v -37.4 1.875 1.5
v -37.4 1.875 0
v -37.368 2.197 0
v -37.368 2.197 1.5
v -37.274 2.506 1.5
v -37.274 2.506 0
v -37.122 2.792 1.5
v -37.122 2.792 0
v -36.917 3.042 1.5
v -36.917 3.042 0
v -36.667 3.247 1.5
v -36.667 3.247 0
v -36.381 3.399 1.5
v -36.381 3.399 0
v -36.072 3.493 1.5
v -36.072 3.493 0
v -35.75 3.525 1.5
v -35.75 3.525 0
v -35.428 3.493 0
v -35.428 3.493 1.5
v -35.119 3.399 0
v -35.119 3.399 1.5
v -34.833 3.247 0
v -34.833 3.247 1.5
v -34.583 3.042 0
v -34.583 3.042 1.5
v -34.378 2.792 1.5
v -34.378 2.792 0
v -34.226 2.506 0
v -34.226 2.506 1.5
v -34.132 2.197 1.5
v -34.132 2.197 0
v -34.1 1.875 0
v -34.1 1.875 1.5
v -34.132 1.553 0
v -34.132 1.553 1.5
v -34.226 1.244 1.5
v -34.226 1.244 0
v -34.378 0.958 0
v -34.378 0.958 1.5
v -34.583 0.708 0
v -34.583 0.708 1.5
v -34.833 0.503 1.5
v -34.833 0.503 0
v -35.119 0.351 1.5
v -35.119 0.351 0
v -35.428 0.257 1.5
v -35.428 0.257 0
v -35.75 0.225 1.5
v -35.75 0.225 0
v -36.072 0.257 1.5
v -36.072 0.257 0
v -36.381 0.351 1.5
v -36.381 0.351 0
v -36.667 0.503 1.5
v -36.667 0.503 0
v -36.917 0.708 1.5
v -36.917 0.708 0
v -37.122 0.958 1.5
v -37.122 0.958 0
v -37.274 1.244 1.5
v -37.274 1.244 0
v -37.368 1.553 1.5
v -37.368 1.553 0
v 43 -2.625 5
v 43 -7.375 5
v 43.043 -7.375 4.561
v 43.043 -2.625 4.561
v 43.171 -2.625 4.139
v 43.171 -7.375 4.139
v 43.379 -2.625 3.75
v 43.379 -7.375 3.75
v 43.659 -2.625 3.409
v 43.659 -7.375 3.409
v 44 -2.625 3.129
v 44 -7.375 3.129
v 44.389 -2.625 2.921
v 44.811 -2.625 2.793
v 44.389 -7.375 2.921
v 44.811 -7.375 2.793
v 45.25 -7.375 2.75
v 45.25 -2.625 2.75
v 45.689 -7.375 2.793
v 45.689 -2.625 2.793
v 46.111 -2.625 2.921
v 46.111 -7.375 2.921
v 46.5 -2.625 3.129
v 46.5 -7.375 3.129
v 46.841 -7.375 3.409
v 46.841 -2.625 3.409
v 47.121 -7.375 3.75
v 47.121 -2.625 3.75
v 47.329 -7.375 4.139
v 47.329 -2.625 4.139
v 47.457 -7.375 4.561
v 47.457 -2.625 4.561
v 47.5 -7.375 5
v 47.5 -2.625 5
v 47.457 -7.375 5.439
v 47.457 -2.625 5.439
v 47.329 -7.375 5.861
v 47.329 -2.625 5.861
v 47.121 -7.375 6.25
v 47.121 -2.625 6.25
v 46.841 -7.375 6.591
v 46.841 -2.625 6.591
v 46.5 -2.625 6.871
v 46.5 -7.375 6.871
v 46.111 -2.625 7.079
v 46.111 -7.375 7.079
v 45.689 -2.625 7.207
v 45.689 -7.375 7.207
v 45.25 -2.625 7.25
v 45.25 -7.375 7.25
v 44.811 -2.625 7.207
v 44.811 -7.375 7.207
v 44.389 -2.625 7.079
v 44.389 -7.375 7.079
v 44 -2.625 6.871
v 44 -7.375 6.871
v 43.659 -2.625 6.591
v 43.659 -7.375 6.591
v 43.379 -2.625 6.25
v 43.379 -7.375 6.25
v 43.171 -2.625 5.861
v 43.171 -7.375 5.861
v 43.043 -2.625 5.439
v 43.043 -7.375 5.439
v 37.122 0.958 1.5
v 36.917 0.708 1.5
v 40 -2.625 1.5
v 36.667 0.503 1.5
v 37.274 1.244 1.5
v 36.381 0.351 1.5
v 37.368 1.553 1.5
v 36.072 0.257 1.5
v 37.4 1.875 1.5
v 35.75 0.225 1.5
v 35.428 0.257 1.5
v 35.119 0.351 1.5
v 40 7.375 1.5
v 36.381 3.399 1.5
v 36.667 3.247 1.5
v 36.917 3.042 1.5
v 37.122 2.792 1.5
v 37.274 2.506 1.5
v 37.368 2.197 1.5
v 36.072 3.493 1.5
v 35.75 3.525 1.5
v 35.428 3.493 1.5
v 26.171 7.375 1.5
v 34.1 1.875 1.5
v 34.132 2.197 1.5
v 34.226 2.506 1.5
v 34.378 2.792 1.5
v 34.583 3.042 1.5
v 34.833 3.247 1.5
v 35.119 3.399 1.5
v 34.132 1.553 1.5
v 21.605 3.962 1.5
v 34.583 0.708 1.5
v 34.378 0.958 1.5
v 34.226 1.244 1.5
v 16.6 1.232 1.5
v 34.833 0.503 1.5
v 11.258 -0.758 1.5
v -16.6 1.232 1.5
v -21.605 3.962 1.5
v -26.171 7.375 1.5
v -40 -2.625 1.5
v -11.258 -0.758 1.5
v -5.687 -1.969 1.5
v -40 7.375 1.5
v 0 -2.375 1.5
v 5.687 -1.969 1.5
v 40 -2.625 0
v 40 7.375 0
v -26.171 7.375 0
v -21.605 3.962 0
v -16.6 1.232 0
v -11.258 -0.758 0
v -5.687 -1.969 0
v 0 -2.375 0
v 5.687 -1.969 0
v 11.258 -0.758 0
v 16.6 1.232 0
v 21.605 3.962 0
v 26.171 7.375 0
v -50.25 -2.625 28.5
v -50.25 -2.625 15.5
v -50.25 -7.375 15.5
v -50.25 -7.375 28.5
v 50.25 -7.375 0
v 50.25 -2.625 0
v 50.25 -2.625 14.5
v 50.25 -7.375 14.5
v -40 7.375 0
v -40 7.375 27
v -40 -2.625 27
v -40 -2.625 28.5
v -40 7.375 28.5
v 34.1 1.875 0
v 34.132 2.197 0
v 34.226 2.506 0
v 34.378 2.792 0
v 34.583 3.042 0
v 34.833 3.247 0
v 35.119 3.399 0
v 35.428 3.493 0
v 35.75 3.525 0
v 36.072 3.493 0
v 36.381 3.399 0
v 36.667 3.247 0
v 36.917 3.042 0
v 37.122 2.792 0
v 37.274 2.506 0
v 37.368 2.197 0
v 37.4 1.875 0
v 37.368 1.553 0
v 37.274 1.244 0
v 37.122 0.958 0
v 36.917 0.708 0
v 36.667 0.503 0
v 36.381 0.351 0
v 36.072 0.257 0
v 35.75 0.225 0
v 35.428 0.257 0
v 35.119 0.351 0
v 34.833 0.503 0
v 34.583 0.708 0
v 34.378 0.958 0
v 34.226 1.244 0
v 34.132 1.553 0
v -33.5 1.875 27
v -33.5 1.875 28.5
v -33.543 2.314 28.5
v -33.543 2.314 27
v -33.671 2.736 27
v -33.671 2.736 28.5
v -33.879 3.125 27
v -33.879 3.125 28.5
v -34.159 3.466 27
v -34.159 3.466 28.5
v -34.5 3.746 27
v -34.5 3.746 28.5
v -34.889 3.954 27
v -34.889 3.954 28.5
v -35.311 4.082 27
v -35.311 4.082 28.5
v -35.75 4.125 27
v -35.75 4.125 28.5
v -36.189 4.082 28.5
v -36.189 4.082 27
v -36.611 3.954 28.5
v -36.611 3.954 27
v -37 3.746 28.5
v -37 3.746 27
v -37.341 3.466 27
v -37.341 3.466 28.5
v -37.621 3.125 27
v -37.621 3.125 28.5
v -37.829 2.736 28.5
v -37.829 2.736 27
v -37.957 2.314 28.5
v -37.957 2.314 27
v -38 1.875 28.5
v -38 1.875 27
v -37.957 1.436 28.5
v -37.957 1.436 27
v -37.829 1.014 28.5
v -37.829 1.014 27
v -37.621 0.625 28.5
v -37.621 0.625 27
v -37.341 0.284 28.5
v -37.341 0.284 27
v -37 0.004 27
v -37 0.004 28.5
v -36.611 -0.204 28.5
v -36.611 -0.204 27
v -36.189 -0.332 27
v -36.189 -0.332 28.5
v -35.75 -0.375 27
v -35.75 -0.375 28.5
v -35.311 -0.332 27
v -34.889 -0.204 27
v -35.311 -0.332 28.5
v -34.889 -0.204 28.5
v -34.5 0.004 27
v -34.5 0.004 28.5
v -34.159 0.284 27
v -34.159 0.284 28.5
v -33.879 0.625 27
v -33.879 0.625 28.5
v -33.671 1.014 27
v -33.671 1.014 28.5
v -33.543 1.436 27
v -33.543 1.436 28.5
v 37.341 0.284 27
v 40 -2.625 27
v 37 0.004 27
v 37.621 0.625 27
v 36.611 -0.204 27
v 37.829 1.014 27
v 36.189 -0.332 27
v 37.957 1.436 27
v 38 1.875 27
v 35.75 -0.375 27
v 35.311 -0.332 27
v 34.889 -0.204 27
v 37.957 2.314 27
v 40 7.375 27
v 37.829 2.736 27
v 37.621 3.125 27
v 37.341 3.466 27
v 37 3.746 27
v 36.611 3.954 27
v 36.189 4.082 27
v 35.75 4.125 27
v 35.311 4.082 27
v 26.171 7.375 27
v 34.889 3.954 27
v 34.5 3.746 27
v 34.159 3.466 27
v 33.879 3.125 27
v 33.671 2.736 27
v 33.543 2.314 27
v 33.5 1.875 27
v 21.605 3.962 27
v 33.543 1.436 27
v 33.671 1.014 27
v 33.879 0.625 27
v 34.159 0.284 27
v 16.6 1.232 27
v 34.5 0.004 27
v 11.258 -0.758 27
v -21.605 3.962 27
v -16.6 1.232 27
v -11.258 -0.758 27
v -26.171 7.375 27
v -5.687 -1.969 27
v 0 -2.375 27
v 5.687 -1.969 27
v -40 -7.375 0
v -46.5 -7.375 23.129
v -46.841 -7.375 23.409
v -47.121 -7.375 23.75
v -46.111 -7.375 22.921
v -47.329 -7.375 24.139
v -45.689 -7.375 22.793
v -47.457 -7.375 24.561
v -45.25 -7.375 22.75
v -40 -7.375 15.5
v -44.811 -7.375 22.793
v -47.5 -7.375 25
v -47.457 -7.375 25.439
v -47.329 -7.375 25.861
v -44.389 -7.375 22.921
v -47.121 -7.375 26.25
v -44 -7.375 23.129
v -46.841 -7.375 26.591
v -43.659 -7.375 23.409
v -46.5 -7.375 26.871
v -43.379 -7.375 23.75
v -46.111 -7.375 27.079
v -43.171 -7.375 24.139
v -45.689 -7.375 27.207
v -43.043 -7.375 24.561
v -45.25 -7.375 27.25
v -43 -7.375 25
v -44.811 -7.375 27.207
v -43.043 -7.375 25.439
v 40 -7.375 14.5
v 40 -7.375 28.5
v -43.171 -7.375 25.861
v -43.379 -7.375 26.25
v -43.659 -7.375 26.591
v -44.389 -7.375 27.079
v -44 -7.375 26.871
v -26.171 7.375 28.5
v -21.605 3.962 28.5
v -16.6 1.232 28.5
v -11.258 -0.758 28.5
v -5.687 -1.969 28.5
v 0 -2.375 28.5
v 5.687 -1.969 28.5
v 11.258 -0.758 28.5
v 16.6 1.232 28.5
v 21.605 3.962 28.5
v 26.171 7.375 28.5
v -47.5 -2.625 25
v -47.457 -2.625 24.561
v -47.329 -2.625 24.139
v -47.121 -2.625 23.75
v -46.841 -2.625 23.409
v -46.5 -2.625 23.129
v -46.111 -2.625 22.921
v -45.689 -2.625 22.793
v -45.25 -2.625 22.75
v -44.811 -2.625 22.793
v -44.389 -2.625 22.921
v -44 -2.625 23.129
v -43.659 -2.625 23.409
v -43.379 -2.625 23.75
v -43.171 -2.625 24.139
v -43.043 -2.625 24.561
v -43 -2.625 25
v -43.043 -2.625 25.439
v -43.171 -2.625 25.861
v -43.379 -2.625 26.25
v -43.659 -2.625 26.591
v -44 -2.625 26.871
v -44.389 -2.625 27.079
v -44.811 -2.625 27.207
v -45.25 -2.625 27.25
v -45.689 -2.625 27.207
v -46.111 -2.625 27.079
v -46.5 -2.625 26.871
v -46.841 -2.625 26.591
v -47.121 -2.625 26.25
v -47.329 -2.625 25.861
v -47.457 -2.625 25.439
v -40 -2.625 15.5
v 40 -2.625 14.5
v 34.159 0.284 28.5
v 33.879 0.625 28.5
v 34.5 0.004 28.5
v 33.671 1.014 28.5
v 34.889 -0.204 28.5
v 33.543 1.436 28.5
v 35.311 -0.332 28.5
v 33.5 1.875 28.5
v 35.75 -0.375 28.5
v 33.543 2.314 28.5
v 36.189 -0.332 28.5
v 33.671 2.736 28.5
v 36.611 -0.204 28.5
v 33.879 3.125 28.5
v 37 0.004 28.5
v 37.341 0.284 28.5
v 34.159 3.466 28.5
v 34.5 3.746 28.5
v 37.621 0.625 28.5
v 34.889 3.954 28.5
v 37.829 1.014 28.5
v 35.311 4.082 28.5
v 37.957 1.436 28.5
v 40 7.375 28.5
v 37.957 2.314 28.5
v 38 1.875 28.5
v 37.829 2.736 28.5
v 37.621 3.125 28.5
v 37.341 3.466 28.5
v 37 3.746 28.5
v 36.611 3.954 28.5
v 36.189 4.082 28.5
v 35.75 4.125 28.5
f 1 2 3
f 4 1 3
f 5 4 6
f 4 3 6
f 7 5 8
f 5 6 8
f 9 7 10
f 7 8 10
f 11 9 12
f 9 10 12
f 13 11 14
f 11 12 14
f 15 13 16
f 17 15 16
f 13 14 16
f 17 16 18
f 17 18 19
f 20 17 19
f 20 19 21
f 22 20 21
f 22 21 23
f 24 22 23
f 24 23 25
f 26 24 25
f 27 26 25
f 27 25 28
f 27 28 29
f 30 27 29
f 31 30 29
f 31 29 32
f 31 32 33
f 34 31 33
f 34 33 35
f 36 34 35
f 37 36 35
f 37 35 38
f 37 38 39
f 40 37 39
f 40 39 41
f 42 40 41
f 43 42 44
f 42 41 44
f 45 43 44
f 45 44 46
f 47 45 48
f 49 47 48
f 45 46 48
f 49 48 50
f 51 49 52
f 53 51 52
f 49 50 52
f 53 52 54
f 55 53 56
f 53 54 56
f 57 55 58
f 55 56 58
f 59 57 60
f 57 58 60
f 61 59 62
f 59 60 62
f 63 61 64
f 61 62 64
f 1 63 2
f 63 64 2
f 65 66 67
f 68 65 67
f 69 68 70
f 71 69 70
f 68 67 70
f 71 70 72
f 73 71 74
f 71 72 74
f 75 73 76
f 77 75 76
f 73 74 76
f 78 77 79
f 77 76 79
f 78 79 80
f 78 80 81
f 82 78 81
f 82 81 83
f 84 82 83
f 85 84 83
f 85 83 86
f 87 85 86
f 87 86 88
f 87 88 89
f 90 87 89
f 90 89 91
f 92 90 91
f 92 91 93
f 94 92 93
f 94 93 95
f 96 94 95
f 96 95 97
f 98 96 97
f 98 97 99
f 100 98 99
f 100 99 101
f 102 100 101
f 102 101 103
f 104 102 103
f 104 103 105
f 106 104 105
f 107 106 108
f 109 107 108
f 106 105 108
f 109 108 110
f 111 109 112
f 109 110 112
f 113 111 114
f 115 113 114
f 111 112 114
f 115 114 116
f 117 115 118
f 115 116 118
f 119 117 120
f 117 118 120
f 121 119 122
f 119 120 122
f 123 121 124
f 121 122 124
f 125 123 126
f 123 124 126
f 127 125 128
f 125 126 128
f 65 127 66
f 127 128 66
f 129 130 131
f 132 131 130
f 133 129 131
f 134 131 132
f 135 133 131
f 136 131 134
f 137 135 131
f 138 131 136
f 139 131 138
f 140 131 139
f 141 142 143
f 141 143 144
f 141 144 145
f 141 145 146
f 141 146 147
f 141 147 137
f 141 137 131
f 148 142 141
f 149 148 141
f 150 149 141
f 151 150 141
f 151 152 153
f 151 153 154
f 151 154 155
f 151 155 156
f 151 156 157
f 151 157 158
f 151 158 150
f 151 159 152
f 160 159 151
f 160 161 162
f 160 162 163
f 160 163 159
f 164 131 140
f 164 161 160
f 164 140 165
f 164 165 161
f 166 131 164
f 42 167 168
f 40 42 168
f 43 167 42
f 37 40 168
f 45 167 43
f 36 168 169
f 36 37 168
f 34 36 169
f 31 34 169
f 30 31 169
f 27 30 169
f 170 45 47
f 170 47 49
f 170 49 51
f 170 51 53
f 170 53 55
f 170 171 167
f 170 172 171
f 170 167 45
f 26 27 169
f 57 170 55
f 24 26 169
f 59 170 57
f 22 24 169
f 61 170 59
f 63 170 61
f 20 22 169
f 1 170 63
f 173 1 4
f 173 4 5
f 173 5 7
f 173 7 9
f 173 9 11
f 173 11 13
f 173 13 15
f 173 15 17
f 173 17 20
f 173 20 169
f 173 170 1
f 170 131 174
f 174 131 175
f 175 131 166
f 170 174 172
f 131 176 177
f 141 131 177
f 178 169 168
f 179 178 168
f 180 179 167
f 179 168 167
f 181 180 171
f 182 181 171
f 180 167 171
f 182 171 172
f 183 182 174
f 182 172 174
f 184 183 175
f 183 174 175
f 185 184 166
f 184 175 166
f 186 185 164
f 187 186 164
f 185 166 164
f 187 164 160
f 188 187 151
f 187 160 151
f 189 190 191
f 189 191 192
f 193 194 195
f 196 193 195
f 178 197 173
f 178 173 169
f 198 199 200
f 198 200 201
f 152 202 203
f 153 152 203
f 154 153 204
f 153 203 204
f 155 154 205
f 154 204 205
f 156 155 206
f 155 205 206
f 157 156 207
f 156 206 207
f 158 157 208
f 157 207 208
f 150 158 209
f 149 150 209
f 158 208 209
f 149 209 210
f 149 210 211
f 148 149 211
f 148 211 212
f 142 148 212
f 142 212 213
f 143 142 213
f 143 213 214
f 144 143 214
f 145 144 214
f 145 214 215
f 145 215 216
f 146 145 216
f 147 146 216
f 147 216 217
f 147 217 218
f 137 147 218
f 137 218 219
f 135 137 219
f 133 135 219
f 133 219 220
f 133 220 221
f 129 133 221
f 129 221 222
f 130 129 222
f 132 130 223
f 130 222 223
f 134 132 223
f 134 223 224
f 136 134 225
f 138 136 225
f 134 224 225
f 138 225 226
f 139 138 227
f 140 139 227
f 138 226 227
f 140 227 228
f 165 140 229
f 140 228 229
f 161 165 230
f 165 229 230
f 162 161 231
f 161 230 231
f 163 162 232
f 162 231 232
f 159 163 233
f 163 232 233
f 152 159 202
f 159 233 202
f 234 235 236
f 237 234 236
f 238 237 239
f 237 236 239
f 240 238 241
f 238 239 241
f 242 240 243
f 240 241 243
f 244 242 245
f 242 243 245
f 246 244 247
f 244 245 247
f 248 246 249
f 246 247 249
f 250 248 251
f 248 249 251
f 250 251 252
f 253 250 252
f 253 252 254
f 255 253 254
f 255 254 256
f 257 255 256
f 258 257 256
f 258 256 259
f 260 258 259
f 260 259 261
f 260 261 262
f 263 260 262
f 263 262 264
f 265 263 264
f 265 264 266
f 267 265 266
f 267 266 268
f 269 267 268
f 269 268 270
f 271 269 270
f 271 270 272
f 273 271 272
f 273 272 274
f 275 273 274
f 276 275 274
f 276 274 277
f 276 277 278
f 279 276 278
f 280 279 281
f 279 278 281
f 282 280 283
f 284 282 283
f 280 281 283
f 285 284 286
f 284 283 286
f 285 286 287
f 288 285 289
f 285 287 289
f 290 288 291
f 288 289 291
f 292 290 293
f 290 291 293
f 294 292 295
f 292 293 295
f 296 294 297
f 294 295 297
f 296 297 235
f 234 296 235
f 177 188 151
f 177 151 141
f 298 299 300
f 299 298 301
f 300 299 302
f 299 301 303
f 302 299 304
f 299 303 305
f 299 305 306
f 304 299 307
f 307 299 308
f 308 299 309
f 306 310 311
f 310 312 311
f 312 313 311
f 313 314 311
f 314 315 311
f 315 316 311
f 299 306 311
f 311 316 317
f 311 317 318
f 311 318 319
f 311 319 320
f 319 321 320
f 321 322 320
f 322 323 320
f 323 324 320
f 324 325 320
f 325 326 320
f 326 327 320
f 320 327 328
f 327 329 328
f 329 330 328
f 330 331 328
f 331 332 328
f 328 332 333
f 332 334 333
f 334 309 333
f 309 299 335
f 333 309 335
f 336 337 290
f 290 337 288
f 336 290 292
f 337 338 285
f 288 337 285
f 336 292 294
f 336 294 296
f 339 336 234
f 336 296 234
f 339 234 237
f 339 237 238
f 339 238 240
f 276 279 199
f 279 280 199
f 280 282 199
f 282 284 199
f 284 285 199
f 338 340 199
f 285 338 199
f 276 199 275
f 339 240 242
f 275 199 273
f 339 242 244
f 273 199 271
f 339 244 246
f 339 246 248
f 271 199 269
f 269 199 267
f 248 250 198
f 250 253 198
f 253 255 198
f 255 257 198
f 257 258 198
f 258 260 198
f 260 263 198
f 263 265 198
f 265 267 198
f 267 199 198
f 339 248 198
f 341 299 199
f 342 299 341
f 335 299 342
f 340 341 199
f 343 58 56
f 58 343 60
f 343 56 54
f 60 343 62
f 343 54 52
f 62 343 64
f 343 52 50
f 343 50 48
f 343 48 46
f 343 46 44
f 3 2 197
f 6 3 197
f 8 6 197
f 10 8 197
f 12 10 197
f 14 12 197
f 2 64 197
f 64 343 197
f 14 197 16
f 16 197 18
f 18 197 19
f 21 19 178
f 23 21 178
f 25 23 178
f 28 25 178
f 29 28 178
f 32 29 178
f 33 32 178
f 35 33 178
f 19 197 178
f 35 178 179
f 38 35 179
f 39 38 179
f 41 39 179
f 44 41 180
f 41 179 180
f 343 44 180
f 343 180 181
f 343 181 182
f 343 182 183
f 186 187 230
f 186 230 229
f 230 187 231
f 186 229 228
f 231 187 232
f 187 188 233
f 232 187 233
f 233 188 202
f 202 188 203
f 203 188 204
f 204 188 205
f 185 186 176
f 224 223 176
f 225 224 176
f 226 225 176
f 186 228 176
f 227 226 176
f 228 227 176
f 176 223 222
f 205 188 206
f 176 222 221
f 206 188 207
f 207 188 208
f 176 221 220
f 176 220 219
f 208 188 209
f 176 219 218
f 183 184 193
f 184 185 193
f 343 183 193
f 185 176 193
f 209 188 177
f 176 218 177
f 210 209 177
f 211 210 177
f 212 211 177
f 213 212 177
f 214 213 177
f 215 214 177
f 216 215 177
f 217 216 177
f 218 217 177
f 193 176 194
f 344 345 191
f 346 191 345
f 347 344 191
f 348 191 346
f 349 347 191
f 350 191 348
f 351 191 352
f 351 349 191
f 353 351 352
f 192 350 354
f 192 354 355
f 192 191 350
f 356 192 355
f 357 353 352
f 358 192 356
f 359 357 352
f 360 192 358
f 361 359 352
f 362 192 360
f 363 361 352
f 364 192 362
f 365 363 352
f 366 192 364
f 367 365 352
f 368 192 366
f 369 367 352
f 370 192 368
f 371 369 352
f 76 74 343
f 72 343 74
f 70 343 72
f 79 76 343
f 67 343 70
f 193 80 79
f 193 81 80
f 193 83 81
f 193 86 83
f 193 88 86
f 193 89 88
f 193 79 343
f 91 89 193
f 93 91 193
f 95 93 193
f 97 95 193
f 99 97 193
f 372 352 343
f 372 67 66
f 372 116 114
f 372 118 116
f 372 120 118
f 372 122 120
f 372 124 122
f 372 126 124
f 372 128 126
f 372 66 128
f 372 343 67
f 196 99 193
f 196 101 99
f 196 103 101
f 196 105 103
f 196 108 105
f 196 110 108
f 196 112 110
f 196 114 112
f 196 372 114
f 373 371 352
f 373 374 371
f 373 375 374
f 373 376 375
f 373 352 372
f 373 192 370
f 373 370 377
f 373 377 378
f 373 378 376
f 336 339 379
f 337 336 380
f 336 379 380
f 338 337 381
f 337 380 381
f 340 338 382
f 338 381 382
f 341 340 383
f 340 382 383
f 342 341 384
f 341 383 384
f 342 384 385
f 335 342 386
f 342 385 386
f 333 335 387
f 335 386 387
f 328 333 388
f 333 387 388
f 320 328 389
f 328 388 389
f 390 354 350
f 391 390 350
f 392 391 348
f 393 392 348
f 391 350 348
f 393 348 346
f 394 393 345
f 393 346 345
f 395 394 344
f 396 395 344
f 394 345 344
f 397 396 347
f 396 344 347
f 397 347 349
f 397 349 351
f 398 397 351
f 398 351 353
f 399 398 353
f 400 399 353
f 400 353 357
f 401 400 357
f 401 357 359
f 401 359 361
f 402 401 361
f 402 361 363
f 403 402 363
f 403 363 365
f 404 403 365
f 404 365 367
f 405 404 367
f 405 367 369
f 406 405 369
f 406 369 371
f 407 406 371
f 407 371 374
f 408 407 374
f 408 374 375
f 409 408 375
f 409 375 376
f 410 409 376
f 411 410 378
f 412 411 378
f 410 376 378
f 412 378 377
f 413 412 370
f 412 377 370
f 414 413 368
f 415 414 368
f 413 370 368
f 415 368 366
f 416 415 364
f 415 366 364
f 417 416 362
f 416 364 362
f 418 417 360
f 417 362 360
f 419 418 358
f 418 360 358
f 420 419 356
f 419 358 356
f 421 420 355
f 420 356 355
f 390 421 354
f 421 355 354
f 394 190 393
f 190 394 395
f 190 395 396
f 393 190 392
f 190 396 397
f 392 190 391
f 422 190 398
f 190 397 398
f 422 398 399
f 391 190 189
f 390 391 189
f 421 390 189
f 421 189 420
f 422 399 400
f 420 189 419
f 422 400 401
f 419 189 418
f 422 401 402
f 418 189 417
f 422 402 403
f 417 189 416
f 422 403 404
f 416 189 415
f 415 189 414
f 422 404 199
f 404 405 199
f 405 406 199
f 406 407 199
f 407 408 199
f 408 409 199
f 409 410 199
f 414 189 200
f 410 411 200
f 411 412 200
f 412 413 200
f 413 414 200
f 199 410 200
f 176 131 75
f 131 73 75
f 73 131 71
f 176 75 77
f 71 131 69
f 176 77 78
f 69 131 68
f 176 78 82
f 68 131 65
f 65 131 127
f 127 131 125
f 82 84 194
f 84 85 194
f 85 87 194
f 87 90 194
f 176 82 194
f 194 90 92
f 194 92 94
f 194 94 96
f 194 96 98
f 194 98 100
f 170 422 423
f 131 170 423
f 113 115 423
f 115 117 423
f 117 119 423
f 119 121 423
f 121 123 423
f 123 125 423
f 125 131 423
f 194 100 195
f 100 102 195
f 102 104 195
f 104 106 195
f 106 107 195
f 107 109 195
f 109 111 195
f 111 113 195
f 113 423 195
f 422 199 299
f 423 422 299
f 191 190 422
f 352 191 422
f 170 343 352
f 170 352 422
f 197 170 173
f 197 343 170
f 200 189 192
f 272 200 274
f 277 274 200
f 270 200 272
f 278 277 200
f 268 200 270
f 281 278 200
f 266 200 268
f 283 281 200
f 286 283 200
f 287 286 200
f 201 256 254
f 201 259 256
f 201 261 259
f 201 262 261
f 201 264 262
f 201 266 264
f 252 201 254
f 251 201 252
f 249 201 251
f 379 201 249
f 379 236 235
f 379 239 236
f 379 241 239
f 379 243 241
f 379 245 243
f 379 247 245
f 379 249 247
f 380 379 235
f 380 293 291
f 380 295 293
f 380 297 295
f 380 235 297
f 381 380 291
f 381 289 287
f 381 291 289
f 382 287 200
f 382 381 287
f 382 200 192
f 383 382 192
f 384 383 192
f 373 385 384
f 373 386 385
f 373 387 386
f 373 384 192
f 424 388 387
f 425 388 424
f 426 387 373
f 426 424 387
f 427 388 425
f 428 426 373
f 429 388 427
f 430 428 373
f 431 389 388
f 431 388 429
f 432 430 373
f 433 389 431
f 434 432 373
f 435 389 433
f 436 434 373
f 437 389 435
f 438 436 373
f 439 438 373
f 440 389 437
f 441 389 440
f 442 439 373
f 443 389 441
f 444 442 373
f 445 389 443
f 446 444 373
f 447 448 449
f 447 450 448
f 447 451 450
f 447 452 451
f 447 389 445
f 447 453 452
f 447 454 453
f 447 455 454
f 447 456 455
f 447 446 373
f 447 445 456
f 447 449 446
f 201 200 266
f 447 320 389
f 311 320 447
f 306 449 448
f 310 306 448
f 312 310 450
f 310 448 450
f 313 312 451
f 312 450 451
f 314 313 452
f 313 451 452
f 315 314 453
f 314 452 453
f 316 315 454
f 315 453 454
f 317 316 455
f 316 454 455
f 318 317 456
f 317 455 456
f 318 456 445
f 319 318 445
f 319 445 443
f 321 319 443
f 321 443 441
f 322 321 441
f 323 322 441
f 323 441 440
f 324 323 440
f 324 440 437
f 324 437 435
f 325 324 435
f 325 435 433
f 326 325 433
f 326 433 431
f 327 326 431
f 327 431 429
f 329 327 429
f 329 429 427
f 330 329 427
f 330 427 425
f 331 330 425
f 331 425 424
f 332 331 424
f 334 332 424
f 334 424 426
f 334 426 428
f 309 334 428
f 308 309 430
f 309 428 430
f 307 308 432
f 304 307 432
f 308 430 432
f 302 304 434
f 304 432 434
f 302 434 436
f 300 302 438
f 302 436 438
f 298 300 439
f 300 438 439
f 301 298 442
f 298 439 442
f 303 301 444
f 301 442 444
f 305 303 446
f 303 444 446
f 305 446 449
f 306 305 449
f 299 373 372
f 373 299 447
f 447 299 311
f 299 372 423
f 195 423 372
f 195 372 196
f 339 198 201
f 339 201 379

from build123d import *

# Parameters (mm, degrees)
SKETCH1_W                 = 80
SKETCH1_H                 = 14.75
BOSS_EXTRUDE1_DEPTH       = 28.5
SKETCH7_W                 = 25.5
SKETCH7_H                 = 10
CUT_EXTRUDE3_DEPTH        = 86.244592937
M4X0_7_TAPPED_HOLE3_D     = 3.3
M4X0_7_TAPPED_HOLE3_DEPTH = 1.5
M4_CLEARANCE_HOLE1_D      = 4.5
M4_CLEARANCE_HOLE1_DEPTH  = 1.5
SKETCH15_R                = 40
CUT_EXTRUDE4_DEPTH        = 50.665285915
BOSS_EXTRUDE3_START       = -4.75
SKETCH19_W                = 10.25
SKETCH19_H                = 13
SKETCH19_H_2              = 14.5
BOSS_EXTRUDE3_DEPTH       = 4.75
M4_CLEARANCE_HOLE3_D      = 4.5


with BuildPart() as part:
    # Sketch1 → Boss-Extrude1 (new body)
    with BuildSketch(Plane.XY):
        Rectangle(SKETCH1_W, SKETCH1_H)
    extrude(amount=BOSS_EXTRUDE1_DEPTH)

    # Sketch7 → Cut-Extrude3 (cut, through all)
    with BuildSketch(Plane.ZY.offset(40)):
        with Locations((14.25, 2.375)):
            Rectangle(SKETCH7_W, SKETCH7_H)
    extrude(amount=-CUT_EXTRUDE3_DEPTH, mode=Mode.SUBTRACT)

    # M4x0.7 Tapped Hole3
    with Locations(Plane.XY.offset(1.5)):
        with Locations((-35.75, 1.875), (35.75, 1.875)):
            Hole(M4X0_7_TAPPED_HOLE3_D / 2, depth=M4X0_7_TAPPED_HOLE3_DEPTH)

    # M4 Clearance Hole1
    with Locations(Plane(origin=(0, 0, 27), x_dir=(-1, 0, 0), z_dir=(0, 0, -1))):
        with Locations((-35.75, 1.875), (35.75, 1.875)):
            Hole(M4_CLEARANCE_HOLE1_D / 2, depth=M4_CLEARANCE_HOLE1_DEPTH)

    # Sketch15 → Cut-Extrude4 (cut, through all)
    with BuildSketch(Plane.XY.offset(28.5)):
        with Locations((0, 37.625)):
            Circle(SKETCH15_R)
    extrude(amount=-CUT_EXTRUDE4_DEPTH, mode=Mode.SUBTRACT)

    # Sketch19 → Boss-Extrude3 (add)
    with BuildSketch(Plane.XZ.offset(7.375).offset(BOSS_EXTRUDE3_START)):
        with Locations((-45.125, 22)):
            Rectangle(SKETCH19_W, SKETCH19_H)
        with Locations((45.125, 7.25)):
            Rectangle(SKETCH19_W, SKETCH19_H_2)
    extrude(amount=BOSS_EXTRUDE3_DEPTH)

    # M4 Clearance Hole3 (through all)
    with Locations(Plane(origin=(0, -2.625, 0), x_dir=(1, 0, 0), z_dir=(0, 1, 0))):
        with Locations((-45.25, -25), (45.25, -5)):
            Hole(M4_CLEARANCE_HOLE3_D / 2)


solid = part.part
